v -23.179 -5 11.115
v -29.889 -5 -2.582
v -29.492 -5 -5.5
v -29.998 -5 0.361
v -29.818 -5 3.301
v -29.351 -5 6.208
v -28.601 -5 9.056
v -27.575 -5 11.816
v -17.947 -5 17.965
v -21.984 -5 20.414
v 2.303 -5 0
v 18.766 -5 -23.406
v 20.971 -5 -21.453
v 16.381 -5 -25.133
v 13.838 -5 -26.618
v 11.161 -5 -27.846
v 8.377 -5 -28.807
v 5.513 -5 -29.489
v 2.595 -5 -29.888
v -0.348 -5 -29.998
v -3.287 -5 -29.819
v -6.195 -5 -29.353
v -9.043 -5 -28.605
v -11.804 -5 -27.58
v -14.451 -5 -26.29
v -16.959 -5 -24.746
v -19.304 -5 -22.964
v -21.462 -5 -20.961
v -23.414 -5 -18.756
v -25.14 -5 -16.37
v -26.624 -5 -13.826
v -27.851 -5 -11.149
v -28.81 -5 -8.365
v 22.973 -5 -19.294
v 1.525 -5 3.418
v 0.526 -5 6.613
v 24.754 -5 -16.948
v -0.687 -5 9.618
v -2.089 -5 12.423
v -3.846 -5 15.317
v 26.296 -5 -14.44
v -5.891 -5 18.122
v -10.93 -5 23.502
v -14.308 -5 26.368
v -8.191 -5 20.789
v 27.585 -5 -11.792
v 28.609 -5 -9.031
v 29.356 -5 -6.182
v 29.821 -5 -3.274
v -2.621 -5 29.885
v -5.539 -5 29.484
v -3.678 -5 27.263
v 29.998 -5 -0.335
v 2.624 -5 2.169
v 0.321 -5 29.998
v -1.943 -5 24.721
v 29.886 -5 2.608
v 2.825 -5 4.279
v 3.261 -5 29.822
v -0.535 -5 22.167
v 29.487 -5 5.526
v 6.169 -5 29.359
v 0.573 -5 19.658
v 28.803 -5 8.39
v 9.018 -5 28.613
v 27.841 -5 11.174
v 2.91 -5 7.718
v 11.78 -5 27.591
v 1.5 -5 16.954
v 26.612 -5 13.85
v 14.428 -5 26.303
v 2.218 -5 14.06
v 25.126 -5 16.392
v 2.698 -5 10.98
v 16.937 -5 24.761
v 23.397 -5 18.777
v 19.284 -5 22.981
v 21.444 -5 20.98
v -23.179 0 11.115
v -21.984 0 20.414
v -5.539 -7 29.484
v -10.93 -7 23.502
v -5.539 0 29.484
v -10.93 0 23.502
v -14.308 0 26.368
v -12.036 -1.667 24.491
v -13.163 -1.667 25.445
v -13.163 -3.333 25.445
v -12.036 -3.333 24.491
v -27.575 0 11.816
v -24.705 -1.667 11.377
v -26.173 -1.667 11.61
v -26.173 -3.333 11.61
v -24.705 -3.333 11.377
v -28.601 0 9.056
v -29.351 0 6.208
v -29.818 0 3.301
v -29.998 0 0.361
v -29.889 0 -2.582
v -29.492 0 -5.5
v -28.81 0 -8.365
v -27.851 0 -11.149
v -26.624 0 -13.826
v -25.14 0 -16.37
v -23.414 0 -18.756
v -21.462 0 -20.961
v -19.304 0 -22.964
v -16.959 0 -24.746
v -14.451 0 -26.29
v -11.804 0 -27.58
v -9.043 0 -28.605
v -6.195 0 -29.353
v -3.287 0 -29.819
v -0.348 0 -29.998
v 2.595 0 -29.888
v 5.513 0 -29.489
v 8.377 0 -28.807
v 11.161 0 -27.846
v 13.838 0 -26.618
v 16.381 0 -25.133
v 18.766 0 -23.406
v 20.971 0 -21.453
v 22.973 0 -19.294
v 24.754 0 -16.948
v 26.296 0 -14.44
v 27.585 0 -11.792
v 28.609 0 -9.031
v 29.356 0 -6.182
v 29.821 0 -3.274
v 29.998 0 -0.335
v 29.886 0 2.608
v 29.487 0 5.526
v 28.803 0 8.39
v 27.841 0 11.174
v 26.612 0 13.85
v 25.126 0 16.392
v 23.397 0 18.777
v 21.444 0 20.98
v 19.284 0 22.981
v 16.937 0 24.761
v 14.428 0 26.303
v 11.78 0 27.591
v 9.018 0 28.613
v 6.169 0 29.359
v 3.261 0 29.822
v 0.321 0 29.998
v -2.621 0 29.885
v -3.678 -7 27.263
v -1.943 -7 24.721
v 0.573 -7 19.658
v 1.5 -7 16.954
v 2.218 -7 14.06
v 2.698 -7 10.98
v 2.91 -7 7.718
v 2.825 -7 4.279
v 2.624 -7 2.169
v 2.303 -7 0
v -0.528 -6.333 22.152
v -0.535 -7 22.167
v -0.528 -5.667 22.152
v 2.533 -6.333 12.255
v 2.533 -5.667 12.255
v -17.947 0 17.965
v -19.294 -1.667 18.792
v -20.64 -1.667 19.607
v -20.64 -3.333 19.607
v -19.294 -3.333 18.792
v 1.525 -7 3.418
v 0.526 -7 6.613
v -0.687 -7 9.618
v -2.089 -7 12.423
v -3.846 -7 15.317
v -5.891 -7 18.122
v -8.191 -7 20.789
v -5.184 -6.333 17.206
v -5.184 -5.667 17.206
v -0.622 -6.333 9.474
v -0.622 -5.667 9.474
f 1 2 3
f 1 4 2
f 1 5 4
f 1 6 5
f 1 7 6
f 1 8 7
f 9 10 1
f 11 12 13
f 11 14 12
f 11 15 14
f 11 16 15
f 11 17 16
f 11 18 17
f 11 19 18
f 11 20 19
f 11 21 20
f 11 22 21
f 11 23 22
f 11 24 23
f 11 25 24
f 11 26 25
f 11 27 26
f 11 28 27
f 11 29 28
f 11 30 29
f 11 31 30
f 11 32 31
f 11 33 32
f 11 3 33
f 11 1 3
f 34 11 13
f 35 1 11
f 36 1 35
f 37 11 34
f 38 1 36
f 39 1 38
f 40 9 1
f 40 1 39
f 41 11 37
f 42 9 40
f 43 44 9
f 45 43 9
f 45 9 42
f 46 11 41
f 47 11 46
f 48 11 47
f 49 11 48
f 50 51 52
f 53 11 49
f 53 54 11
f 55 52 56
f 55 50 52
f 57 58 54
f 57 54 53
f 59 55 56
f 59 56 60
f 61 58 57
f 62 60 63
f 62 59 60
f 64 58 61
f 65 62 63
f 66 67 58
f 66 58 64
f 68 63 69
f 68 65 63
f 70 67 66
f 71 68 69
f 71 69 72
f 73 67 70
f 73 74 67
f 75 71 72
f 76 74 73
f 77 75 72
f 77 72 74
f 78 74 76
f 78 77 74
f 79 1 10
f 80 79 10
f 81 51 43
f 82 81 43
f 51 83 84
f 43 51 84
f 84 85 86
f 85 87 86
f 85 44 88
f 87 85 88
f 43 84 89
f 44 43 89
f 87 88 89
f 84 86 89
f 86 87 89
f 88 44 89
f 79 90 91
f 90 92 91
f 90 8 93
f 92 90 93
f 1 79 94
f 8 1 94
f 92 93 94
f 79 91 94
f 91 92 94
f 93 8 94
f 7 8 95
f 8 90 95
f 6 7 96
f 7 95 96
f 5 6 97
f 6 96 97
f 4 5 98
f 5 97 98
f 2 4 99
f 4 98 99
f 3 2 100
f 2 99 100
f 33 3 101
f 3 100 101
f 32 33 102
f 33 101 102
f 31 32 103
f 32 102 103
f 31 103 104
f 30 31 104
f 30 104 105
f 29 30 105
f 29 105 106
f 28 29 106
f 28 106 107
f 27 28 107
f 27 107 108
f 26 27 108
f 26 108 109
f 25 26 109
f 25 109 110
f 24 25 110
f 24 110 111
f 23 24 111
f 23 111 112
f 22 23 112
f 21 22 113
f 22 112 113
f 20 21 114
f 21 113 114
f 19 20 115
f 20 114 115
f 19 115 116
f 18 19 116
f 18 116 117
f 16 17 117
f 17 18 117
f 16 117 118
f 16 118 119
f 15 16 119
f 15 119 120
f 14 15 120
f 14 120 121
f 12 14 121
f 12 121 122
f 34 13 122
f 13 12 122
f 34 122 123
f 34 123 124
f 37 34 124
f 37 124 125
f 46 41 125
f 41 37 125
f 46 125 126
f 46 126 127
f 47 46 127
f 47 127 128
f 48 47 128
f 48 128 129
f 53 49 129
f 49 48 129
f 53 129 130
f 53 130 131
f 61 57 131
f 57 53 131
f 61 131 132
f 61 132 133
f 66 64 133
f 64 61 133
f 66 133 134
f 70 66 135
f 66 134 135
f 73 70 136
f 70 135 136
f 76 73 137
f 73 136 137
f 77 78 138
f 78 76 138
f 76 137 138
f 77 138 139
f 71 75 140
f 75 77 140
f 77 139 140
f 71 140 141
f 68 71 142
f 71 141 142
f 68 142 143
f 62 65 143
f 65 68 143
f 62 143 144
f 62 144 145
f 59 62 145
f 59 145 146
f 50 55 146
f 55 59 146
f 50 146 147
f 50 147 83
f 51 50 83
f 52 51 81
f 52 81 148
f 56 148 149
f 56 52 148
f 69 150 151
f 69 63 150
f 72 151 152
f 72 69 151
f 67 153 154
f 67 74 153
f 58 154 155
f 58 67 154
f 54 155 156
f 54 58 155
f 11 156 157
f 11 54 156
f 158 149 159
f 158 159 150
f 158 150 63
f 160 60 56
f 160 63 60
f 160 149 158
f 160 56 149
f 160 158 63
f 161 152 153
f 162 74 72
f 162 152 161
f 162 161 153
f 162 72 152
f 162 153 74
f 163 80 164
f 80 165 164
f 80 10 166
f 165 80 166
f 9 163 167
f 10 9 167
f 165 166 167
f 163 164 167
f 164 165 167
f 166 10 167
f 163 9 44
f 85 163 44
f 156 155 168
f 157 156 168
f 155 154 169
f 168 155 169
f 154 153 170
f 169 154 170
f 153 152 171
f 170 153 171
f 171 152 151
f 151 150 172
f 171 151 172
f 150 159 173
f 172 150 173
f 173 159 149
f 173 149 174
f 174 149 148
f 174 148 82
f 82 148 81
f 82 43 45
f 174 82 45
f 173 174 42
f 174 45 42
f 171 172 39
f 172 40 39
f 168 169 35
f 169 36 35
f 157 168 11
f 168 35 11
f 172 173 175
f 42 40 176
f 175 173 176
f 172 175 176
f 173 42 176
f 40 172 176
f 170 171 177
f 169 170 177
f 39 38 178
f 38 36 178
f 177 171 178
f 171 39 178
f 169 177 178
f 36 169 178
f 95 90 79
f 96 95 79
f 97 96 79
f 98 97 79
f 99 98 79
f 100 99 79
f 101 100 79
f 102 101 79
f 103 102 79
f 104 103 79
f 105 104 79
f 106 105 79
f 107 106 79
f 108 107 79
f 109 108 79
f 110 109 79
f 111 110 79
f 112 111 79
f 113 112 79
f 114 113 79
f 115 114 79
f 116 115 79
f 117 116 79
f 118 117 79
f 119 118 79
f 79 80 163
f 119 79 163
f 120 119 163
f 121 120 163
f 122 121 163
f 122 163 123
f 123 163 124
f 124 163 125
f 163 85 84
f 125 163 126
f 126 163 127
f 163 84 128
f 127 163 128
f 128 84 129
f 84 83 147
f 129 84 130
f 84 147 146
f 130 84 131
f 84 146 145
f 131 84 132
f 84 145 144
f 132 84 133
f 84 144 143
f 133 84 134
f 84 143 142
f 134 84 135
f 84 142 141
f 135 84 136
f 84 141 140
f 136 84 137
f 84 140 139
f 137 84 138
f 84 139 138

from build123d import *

# Parameters (mm, degrees)
F0_R     = 30
F1_DEPTH = 5
F4_DEPTH = 5
F5_DEPTH = 5
F6_DEPTH = 5
F7_DEPTH = 2


with BuildPart() as f1:
    # F0 (on Front) → F1 (new body)
    with BuildSketch(Plane.XZ):
        Circle(F0_R)
    extrude(amount=F1_DEPTH)

    # F3 (on face) → F4 (cut)
    with BuildSketch(Plane.XZ.offset(5)):
        with BuildLine():
            Line((-10.9299741999, 23.5023200512), (-5.5388955, 29.4842438709))
            ThreePointArc((-5.5388955, 29.4842438709), (-10.0449779303, 28.2683288926), (-14.3079358656, 26.3682189627))
            add(Edge.make_bspline(
                [(-14.3079358656, 26.3682189627), (-13.1550391421, 25.4607855158), (-12.0252922437, 24.5080470289), (-10.9299741999, 23.5023200512)],
                knots=[0, 0, 0, 0, 4.6870131966, 4.6870131966, 4.6870131966, 4.6870131966], degree=3))
        make_face()
    extrude(amount=-F4_DEPTH, mode=Mode.SUBTRACT)

    # F3 (on face) → F5 (cut)
    with BuildSketch(Plane.XZ.offset(5)):
        with BuildLine():
            Line((-17.9465766996, 17.9648566991), (-14.3079358656, 26.3682189627))
            ThreePointArc((-14.3079358656, 26.3682189627), (-18.3884401049, 23.7036974016), (-21.9836899596, 20.4136565995))
            add(Edge.make_bspline(
                [(-21.9836899596, 20.4136565995), (-20.642975191, 19.610865703), (-19.293517456, 18.7987052228), (-17.9465766996, 17.9648566991)],
                knots=[0, 0, 0, 0, 4.8486235733, 4.8486235733, 4.8486235733, 4.8486235733], degree=3))
        make_face()
    extrude(amount=-F5_DEPTH, mode=Mode.SUBTRACT)

    # F3 (on face) → F6 (cut)
    with BuildSketch(Plane.XZ.offset(5)):
        with BuildLine():
            Line((-23.1792298082, 11.114937143), (-21.9836899596, 20.4136565995))
            ThreePointArc((-21.9836899596, 20.4136565995), (-25.1493367192, 16.3557593094), (-27.5748147519, 11.8164965789))
            add(Edge.make_bspline(
                [(-27.5748147519, 11.8164965789), (-26.208679714, 11.6220681724), (-24.7320616466, 11.3922656282), (-23.1792298082, 11.114937143)],
                knots=[0, 0, 0, 0, 5.1239362549, 5.1239362549, 5.1239362549, 5.1239362549], degree=3))
        make_face()
    extrude(amount=-F6_DEPTH, mode=Mode.SUBTRACT)

    # F3 (on face) → F7 (join)
    with BuildSketch(Plane.XZ.offset(5)):
        with BuildLine():
            add(Edge.make_bspline(
                [(-5.5388955, 29.4842438709), (0, 23.5023200512), (4.6262064465, 13.365700841), (2.3032309004, 0)],
                knots=[0, 0, 0, 0, 30.5093359993, 30.5093359993, 30.5093359993, 30.5093359993], degree=3))
            Line((-5.5388955, 29.4842438709), (-10.9299741999, 23.5023200512))
            add(Edge.make_bspline(
                [(-10.9299741999, 23.5023200512), (-4.7424400597, 17.8208925919), (0.3463986774, 10.4484936531), (2.3032309004, 0)],
                knots=[4.6870131966, 4.6870131966, 4.6870131966, 4.6870131966, 31.1643038201, 31.1643038201, 31.1643038201, 31.1643038201], degree=3))
        make_face()
    extrude(amount=F7_DEPTH)


solid = f1.part
